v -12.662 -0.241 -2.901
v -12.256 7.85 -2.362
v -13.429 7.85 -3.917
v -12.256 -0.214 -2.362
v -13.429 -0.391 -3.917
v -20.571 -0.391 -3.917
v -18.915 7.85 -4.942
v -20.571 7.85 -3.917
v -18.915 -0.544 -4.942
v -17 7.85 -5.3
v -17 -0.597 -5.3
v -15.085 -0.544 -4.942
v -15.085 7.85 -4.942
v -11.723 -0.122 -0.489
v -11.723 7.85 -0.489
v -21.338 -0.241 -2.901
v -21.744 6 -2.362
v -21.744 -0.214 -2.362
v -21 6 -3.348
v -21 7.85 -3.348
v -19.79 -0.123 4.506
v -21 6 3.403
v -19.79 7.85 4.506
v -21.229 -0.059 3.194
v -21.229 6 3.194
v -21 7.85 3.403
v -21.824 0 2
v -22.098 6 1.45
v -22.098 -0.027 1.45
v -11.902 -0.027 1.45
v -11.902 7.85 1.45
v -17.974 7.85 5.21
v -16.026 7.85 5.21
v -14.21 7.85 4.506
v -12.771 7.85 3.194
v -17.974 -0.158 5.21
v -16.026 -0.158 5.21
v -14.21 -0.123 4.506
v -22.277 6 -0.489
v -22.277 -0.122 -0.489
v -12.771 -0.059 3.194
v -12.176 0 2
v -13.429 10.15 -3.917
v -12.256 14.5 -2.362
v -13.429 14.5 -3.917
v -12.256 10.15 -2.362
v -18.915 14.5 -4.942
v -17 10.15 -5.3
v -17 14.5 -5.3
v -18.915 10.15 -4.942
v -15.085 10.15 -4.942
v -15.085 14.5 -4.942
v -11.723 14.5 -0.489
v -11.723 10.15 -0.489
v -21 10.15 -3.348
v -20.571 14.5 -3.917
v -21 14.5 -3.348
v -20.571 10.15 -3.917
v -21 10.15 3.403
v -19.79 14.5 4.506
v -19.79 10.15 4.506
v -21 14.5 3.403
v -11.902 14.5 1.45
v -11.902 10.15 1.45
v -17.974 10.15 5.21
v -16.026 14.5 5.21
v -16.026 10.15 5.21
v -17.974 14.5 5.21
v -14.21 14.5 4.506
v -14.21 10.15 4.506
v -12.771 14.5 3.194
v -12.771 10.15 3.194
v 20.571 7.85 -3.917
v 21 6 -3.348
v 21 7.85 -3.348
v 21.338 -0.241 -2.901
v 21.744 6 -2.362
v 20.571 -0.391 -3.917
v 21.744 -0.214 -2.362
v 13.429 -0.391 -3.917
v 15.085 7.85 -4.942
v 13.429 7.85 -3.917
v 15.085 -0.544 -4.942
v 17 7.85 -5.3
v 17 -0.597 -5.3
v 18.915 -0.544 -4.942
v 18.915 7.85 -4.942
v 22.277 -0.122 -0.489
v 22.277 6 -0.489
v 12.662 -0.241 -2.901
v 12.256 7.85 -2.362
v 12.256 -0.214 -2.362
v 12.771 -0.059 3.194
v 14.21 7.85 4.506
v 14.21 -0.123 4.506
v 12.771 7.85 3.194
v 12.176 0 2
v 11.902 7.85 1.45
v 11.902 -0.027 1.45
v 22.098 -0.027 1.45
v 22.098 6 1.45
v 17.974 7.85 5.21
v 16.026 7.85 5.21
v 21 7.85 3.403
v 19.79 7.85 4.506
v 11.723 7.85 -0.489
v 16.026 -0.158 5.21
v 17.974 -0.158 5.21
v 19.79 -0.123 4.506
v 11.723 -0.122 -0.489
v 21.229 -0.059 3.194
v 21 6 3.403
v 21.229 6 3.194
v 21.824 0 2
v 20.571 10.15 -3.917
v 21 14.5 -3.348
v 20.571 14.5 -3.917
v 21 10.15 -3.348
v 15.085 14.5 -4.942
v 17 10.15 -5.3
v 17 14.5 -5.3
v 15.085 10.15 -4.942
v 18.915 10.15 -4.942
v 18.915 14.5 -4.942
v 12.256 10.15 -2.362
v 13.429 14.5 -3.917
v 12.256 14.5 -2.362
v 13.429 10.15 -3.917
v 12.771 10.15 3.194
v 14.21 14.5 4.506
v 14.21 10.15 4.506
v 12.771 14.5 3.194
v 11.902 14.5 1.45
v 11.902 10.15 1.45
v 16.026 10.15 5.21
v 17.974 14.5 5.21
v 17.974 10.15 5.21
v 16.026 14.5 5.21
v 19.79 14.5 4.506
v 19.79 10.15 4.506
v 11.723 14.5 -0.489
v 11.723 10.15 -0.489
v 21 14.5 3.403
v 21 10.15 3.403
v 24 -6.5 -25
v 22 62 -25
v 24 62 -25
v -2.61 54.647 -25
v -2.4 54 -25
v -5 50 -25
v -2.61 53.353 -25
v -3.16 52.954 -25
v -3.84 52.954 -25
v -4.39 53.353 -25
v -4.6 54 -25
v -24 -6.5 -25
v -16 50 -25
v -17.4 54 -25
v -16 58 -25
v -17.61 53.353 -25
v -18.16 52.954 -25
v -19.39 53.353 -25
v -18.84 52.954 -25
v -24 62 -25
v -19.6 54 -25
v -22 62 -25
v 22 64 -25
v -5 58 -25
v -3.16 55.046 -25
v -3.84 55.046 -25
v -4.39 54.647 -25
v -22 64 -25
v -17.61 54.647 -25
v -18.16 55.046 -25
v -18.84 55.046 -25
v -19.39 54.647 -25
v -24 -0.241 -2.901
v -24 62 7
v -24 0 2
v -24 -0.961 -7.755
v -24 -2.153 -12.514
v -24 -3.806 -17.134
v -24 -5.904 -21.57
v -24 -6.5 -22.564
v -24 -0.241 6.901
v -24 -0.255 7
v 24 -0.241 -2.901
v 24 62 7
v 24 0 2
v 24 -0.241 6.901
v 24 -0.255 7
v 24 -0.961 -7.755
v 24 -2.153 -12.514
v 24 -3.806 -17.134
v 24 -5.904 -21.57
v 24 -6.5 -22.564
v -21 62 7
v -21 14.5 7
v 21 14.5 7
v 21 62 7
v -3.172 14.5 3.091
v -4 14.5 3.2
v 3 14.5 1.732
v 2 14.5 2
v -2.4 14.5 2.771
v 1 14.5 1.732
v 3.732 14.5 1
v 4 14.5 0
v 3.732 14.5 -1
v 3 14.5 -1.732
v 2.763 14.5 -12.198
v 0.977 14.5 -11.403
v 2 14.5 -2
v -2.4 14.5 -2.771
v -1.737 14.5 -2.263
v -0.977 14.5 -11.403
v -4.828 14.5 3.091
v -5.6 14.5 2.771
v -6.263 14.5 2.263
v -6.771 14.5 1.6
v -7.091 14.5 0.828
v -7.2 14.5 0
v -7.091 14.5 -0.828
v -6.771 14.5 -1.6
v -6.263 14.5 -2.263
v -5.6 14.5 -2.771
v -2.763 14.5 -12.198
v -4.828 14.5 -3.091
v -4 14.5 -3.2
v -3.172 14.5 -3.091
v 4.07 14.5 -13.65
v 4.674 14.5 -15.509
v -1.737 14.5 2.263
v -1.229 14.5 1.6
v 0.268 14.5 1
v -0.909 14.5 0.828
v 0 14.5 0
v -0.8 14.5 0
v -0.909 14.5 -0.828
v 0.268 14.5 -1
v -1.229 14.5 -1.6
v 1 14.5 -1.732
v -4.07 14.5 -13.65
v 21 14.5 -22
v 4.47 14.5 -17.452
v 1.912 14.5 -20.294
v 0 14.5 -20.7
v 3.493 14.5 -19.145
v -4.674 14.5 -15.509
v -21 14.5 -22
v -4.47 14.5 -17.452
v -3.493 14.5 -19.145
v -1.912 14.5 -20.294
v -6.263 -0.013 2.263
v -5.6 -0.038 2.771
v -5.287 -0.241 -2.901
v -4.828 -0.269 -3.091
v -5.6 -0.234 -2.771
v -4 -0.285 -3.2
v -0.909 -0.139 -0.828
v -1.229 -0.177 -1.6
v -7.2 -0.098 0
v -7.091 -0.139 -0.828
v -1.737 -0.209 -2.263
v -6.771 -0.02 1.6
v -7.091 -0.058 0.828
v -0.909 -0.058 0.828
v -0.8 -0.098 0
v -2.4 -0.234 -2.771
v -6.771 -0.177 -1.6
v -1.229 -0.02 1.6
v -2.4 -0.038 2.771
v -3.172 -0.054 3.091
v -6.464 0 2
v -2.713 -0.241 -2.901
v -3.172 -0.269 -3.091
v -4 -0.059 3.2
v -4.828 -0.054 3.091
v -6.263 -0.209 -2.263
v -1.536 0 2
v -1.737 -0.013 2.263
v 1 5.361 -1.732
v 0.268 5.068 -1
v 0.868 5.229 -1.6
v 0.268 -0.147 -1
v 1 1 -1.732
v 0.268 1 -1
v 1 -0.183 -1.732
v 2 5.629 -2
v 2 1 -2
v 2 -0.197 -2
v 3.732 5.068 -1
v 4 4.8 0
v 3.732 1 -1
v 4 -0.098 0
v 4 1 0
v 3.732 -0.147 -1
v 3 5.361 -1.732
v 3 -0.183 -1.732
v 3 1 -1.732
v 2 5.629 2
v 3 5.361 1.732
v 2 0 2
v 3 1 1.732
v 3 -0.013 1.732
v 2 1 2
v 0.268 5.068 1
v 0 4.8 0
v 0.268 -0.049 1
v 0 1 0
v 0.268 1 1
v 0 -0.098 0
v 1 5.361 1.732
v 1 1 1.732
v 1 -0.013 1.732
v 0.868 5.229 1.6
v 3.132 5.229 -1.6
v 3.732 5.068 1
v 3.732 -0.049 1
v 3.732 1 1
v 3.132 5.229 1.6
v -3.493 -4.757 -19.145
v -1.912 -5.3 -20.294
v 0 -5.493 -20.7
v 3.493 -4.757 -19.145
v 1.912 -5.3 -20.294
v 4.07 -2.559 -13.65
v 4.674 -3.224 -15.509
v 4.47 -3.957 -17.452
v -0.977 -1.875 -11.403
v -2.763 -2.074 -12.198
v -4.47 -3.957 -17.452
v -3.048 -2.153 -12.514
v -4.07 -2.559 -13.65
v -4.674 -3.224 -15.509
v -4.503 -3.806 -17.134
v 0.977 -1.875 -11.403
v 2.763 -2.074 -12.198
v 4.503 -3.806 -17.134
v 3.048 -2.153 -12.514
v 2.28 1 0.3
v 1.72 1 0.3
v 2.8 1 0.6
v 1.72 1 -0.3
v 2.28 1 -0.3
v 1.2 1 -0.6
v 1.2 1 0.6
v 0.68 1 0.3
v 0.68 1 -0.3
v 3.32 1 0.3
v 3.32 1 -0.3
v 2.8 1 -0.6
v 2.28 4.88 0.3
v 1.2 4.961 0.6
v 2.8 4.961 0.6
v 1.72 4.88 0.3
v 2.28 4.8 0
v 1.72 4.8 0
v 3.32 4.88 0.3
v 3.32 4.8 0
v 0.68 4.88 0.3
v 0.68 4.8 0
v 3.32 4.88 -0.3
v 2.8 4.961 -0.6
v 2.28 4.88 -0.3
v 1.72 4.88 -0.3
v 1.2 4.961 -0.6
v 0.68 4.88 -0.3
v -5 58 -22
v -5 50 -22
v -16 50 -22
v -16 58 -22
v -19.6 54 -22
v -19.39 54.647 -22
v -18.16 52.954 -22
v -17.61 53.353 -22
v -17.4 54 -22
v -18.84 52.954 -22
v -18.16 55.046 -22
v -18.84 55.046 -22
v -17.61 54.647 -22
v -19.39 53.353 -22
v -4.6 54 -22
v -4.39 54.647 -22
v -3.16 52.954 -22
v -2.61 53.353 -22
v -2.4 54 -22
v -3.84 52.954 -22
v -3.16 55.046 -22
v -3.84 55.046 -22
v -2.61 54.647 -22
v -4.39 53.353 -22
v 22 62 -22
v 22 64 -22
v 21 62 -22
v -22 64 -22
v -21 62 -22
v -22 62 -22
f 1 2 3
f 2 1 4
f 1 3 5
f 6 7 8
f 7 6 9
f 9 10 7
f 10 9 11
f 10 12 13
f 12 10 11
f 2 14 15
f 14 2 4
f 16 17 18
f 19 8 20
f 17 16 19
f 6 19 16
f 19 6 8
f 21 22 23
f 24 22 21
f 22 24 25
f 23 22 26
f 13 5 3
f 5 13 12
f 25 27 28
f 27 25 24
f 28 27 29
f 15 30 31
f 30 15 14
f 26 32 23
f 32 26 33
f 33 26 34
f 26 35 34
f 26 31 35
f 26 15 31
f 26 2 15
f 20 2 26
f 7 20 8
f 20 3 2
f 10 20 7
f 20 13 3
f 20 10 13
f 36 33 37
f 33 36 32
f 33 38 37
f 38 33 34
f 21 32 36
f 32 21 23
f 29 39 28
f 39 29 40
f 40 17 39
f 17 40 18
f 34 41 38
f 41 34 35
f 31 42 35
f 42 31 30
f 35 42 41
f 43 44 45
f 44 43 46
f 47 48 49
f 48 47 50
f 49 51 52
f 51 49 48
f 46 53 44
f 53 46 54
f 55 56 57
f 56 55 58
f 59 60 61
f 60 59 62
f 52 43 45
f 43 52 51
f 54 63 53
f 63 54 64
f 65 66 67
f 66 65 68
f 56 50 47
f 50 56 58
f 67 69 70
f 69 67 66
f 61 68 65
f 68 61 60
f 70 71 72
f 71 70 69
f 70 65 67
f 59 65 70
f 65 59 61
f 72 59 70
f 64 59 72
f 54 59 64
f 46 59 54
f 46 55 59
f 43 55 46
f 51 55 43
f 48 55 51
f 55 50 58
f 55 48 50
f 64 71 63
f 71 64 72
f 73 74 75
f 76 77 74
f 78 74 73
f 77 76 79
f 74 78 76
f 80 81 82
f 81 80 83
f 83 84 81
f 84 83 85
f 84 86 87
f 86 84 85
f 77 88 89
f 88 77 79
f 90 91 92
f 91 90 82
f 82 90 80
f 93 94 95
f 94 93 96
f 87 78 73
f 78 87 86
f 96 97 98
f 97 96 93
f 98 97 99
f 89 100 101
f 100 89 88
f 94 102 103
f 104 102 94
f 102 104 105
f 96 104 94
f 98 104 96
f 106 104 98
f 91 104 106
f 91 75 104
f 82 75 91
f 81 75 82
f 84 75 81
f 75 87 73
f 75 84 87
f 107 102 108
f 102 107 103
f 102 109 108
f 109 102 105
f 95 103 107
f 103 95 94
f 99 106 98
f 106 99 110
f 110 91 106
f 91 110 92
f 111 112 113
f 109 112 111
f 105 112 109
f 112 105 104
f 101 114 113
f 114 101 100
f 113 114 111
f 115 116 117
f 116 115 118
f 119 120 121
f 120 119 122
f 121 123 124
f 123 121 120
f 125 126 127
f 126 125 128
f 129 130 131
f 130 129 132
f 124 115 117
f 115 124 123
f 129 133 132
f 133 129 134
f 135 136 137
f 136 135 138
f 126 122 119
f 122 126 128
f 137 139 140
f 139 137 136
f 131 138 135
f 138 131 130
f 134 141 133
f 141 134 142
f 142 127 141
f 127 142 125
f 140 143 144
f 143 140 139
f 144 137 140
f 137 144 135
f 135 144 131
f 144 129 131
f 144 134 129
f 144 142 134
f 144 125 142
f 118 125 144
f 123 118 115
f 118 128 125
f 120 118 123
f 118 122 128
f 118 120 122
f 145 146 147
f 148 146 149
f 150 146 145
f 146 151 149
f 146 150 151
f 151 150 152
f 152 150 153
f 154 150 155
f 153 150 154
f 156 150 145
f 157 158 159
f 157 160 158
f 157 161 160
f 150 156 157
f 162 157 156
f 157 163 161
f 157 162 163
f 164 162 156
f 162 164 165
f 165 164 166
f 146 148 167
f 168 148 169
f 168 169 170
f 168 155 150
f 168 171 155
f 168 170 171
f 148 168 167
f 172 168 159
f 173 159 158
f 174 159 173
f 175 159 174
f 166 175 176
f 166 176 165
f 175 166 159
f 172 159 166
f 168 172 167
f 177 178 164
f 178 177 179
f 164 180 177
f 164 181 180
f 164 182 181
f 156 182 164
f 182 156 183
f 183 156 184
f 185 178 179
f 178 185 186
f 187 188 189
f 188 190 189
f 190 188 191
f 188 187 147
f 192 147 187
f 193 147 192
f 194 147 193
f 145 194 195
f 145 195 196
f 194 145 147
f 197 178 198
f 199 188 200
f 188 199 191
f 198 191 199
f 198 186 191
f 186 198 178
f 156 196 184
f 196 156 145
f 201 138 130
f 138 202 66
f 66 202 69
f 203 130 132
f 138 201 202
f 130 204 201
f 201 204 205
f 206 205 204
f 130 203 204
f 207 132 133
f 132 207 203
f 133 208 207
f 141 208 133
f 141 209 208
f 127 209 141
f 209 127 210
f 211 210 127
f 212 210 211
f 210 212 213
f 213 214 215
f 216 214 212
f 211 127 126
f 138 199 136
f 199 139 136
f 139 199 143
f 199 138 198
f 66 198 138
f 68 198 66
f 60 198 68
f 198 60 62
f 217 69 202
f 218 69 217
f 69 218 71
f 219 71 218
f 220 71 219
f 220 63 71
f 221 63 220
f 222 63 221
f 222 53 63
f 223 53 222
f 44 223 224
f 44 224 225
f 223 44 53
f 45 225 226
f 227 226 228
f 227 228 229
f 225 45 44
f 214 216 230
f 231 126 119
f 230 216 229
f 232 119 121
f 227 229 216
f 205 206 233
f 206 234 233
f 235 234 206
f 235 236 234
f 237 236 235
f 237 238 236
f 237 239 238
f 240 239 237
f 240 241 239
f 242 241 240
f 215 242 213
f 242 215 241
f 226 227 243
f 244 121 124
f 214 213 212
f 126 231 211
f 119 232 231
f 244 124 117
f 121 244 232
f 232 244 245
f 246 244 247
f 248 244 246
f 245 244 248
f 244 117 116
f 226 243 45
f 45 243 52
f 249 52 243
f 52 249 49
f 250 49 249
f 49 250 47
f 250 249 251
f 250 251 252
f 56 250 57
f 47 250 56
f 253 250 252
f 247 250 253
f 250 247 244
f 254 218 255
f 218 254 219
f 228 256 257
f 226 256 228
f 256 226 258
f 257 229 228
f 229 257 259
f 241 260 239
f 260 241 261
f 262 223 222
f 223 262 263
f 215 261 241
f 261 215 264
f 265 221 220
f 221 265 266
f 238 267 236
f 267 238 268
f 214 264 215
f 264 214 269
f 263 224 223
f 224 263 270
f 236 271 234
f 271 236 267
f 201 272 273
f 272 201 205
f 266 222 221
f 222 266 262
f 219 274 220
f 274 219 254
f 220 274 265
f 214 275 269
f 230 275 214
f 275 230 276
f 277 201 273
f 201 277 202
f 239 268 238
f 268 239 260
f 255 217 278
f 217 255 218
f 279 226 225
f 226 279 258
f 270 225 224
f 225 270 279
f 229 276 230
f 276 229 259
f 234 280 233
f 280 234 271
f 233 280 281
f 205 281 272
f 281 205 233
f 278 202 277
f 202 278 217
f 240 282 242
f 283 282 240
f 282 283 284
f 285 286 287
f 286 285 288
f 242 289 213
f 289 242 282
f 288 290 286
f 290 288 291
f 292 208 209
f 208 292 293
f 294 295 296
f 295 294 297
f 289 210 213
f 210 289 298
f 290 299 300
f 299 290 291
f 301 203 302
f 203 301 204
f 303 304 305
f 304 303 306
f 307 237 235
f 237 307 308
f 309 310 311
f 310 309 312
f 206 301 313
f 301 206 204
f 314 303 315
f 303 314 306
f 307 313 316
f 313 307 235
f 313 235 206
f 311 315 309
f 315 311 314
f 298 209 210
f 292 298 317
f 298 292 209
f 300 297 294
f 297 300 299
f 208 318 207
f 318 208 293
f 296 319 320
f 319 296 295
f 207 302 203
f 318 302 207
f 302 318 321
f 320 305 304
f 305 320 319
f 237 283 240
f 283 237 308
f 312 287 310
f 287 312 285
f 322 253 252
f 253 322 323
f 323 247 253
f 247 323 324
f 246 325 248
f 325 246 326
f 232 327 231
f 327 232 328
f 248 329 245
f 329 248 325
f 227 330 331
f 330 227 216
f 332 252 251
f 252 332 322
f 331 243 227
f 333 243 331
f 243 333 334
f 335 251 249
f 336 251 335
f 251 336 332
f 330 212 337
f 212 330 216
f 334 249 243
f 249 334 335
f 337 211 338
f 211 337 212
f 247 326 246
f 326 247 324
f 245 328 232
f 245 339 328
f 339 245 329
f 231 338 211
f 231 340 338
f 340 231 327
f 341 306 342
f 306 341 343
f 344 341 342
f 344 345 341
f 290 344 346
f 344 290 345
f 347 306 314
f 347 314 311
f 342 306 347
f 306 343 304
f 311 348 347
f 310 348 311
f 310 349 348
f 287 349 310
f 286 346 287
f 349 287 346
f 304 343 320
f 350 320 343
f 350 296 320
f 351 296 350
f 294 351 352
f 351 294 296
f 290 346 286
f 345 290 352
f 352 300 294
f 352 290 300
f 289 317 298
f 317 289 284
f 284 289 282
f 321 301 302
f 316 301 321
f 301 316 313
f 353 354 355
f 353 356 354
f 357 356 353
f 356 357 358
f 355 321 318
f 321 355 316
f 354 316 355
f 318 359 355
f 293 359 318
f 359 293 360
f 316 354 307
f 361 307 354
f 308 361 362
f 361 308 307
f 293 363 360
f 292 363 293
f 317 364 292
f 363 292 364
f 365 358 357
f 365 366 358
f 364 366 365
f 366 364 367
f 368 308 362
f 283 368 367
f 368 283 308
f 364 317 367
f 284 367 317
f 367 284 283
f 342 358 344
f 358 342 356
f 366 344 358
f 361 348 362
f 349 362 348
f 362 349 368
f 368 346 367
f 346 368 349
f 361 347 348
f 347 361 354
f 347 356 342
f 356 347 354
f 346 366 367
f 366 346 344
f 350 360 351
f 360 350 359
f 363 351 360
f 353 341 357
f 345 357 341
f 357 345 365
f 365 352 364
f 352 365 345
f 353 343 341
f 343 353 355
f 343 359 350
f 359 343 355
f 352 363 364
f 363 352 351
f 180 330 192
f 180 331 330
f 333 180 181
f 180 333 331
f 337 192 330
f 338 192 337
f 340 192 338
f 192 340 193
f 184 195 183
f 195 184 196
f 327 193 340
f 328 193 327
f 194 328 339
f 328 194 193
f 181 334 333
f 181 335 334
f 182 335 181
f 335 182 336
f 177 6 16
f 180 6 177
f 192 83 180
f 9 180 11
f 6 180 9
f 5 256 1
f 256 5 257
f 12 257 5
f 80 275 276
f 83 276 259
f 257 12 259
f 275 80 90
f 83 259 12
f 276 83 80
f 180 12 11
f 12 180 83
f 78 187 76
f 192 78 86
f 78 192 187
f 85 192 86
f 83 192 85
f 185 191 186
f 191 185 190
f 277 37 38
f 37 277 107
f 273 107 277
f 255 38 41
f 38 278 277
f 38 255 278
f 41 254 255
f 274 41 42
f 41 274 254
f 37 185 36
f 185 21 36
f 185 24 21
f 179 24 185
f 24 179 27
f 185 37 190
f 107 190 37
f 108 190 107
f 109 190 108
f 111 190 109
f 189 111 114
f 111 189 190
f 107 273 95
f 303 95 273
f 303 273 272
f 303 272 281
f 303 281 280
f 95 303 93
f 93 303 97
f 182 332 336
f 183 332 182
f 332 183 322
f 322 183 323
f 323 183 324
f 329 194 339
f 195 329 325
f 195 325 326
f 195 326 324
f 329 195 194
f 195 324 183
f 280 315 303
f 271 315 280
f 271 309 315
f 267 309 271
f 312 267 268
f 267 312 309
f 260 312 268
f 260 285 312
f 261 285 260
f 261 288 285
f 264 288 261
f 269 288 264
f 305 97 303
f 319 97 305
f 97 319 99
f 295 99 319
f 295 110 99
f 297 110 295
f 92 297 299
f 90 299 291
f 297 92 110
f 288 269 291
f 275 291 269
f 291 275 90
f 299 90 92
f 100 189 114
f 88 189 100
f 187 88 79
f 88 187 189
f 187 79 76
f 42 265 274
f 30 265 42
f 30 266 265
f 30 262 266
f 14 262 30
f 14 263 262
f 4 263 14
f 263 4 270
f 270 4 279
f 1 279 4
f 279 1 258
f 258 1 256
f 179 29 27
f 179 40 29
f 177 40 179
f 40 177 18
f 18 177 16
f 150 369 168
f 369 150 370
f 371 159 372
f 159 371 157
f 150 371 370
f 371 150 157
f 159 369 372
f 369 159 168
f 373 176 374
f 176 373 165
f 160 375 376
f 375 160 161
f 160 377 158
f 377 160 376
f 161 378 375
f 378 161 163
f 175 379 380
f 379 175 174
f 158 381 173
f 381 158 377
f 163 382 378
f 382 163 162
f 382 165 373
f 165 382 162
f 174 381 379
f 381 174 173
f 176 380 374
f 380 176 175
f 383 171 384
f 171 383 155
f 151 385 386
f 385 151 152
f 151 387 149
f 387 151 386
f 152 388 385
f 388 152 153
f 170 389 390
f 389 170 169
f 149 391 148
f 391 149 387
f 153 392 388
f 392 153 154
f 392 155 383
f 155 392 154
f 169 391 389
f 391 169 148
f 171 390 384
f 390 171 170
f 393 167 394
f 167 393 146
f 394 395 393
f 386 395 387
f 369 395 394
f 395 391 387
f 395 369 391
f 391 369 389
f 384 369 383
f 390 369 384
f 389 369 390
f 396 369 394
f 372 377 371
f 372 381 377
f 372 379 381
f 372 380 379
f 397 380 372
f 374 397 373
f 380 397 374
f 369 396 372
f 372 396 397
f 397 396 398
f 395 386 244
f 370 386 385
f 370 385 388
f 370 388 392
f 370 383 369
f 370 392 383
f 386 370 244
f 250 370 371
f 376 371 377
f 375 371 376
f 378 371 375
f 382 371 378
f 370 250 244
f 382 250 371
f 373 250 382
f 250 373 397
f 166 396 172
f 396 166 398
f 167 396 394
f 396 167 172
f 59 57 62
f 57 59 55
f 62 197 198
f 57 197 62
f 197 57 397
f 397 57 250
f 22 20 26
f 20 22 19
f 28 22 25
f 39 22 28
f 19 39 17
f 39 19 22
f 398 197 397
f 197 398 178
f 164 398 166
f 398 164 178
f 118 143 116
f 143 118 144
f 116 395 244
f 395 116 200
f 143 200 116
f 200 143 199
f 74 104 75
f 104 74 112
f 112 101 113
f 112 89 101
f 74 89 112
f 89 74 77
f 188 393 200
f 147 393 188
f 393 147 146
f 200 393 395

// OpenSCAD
diameter=10;
height=4;
number=3;
distance=5;
baseline=30; 


module maghole(diameter,height,number,back) {
		translate([0,height*(number-2)/2,0])
        rotate([90,0,0])
         cylinder(r=diameter/2,h=height*(2*number-1),center=true);
    if(back == 1) {
		translate([0,-height*2*(number+1)/2,0])
        rotate([90,0,0])
         cylinder(r=diameter/2,h=height*number,center=true);
    }
}

module smaghole(diameter,height,number,back) {
		translate([0,.15+height*(number-2)/2,0])
        rotate([90,0,0])
         cylinder(r=0.3+diameter/2,h=height*(2*number-1),center=true);
    if(back == 1) {
		translate([0,-(0.15+height*2*(number+1)/2),0])
        rotate([90,0,0])
         cylinder(r=0.3+diameter/2,h=height*number,center=true);
    }
}
module mirror(diameter,height,number,distance,baseline) {
width=diameter+4;
depth=distance+height*number+4;
length=baseline+diameter+8;
mirrorthick = 2.7;
   difference() {
     translate([0,-height,0])
	   cube([width,  // Small dimension
            depth, // Optical path dim
		      length],center=true);
      translate([0,0,2+baseline/2])
             maghole(diameter,height,number,0);
     translate([0,0,-(2+baseline/2)])
             maghole(diameter,height,number,0);
     translate([0,depth/4,0])
          cube([width+2,depth+2,length-2*width],center=true);
    rotate([7,0,0])
     translate([0,0.6-depth/3,0.75])
          cube([width+2,mirrorthick+0.6,length-(2*diameter+4)],center=true);
     }
}

module sensor(diameter,height,number,distance,baseline) {
width=diameter+4;
depth=distance+height*number+4;
length=baseline+diameter+8;
mirrorthick = 2.6;
extra=2*width+4;

   difference() {
     translate([2+width/2,-height,0])
	   cube([extra,  // Small dimension
            depth, // Optical path dim
		      length],center=true);
      translate([0,0,2+baseline/2])
             smaghole(diameter,height,number,1);
     translate([0,0,-(2+baseline/2)])
             smaghole(diameter,height,number,1);
//LASER
     translate([0,0,4])
        rotate([90,0,0])
             cylinder(r=3.2,h=40,center=true,$fn=24);
//PhotoTransistor
     translate([0,0,-2])
        rotate([90,0,0])
             cylinder(r=2,h=40,center=true,$fn=12);
// TEMP SENSOR
     translate([2+width,0,0])
        rotate([90,0,0])
             cylinder(r=4.7,h=40,center=true);

     }

     difference() {
     translate([0,-4,-2.5])cube([5,6,5],center=true);
     translate([0,-8,0])
        cylinder(r=3.2,h=10,center=true,$fn=12);
     translate([0,0,-1.2])
        rotate([90,0,0])
             cylinder(r=0.6,h=40,center=true,$fn=6);
     translate([0,0,-2.8])
        rotate([90,0,0])
             cylinder(r=0.6,h=40,center=true,$fn=6);
     }
}

module jarwall() {
  difference() {
     cube([40,40,120],center=true);
	  translate([40,0,0])
	     cylinder(r=50,h=120,center=true,$fn=64);
	   }
}

module jar() {
	  translate([-8,110,-10])
	          cylinder(r=50,h=120,center=true,$fn=64);
}

module powerhole(dim) {
offset = dim+2;
  //  cylinder(r=dim,h=2*dim,center=true,$fn=10);
  //  translate([dim-1.6,0,0])
   //   cylinder(r=dim,h=dim,center=true,$fn=10);
    translate([dim-3,0,0]) cube([2*dim+2,2*dim-1,2*dim-1],center=true);
    translate([-offset,0,0])
      cylinder(r=1.1,h=2*dim,center=true,$fn=10);
    translate([offset+2,0,0])
      cylinder(r=1.1,h=2*dim,center=true,$fn=10);
}

module sensordevice() {
  wall = 32;
  side = 44;
  deep = 50;
  difference() { 
   sensor(diameter,height,number,distance,baseline);
   translate([6,-60,3]) jar();
  }
  translate([-7,-(wall+30),21]) cube([wall,side+12,3]);

     translate([-7,-(wall+30),-24])
         cube([wall,side+12,3]);

  difference() {
  translate([23.5,-(wall+7),0])
    rotate([0,90,0])
    cube([side,deep,3],center=true);
     translate([24,-54,12])
			rotate([0,90,0]) 
           powerhole(4.5);
  }
}
module mirrordevice() {
  difference() { 
   mirror(diameter,height,number,distance,baseline);
   translate([0,-3.3,0]) rotate([0,0,-90]) jarwall();
  }
}

rotate([0,90,180]) 
   sensordevice();
  // mirrordevice();



     
